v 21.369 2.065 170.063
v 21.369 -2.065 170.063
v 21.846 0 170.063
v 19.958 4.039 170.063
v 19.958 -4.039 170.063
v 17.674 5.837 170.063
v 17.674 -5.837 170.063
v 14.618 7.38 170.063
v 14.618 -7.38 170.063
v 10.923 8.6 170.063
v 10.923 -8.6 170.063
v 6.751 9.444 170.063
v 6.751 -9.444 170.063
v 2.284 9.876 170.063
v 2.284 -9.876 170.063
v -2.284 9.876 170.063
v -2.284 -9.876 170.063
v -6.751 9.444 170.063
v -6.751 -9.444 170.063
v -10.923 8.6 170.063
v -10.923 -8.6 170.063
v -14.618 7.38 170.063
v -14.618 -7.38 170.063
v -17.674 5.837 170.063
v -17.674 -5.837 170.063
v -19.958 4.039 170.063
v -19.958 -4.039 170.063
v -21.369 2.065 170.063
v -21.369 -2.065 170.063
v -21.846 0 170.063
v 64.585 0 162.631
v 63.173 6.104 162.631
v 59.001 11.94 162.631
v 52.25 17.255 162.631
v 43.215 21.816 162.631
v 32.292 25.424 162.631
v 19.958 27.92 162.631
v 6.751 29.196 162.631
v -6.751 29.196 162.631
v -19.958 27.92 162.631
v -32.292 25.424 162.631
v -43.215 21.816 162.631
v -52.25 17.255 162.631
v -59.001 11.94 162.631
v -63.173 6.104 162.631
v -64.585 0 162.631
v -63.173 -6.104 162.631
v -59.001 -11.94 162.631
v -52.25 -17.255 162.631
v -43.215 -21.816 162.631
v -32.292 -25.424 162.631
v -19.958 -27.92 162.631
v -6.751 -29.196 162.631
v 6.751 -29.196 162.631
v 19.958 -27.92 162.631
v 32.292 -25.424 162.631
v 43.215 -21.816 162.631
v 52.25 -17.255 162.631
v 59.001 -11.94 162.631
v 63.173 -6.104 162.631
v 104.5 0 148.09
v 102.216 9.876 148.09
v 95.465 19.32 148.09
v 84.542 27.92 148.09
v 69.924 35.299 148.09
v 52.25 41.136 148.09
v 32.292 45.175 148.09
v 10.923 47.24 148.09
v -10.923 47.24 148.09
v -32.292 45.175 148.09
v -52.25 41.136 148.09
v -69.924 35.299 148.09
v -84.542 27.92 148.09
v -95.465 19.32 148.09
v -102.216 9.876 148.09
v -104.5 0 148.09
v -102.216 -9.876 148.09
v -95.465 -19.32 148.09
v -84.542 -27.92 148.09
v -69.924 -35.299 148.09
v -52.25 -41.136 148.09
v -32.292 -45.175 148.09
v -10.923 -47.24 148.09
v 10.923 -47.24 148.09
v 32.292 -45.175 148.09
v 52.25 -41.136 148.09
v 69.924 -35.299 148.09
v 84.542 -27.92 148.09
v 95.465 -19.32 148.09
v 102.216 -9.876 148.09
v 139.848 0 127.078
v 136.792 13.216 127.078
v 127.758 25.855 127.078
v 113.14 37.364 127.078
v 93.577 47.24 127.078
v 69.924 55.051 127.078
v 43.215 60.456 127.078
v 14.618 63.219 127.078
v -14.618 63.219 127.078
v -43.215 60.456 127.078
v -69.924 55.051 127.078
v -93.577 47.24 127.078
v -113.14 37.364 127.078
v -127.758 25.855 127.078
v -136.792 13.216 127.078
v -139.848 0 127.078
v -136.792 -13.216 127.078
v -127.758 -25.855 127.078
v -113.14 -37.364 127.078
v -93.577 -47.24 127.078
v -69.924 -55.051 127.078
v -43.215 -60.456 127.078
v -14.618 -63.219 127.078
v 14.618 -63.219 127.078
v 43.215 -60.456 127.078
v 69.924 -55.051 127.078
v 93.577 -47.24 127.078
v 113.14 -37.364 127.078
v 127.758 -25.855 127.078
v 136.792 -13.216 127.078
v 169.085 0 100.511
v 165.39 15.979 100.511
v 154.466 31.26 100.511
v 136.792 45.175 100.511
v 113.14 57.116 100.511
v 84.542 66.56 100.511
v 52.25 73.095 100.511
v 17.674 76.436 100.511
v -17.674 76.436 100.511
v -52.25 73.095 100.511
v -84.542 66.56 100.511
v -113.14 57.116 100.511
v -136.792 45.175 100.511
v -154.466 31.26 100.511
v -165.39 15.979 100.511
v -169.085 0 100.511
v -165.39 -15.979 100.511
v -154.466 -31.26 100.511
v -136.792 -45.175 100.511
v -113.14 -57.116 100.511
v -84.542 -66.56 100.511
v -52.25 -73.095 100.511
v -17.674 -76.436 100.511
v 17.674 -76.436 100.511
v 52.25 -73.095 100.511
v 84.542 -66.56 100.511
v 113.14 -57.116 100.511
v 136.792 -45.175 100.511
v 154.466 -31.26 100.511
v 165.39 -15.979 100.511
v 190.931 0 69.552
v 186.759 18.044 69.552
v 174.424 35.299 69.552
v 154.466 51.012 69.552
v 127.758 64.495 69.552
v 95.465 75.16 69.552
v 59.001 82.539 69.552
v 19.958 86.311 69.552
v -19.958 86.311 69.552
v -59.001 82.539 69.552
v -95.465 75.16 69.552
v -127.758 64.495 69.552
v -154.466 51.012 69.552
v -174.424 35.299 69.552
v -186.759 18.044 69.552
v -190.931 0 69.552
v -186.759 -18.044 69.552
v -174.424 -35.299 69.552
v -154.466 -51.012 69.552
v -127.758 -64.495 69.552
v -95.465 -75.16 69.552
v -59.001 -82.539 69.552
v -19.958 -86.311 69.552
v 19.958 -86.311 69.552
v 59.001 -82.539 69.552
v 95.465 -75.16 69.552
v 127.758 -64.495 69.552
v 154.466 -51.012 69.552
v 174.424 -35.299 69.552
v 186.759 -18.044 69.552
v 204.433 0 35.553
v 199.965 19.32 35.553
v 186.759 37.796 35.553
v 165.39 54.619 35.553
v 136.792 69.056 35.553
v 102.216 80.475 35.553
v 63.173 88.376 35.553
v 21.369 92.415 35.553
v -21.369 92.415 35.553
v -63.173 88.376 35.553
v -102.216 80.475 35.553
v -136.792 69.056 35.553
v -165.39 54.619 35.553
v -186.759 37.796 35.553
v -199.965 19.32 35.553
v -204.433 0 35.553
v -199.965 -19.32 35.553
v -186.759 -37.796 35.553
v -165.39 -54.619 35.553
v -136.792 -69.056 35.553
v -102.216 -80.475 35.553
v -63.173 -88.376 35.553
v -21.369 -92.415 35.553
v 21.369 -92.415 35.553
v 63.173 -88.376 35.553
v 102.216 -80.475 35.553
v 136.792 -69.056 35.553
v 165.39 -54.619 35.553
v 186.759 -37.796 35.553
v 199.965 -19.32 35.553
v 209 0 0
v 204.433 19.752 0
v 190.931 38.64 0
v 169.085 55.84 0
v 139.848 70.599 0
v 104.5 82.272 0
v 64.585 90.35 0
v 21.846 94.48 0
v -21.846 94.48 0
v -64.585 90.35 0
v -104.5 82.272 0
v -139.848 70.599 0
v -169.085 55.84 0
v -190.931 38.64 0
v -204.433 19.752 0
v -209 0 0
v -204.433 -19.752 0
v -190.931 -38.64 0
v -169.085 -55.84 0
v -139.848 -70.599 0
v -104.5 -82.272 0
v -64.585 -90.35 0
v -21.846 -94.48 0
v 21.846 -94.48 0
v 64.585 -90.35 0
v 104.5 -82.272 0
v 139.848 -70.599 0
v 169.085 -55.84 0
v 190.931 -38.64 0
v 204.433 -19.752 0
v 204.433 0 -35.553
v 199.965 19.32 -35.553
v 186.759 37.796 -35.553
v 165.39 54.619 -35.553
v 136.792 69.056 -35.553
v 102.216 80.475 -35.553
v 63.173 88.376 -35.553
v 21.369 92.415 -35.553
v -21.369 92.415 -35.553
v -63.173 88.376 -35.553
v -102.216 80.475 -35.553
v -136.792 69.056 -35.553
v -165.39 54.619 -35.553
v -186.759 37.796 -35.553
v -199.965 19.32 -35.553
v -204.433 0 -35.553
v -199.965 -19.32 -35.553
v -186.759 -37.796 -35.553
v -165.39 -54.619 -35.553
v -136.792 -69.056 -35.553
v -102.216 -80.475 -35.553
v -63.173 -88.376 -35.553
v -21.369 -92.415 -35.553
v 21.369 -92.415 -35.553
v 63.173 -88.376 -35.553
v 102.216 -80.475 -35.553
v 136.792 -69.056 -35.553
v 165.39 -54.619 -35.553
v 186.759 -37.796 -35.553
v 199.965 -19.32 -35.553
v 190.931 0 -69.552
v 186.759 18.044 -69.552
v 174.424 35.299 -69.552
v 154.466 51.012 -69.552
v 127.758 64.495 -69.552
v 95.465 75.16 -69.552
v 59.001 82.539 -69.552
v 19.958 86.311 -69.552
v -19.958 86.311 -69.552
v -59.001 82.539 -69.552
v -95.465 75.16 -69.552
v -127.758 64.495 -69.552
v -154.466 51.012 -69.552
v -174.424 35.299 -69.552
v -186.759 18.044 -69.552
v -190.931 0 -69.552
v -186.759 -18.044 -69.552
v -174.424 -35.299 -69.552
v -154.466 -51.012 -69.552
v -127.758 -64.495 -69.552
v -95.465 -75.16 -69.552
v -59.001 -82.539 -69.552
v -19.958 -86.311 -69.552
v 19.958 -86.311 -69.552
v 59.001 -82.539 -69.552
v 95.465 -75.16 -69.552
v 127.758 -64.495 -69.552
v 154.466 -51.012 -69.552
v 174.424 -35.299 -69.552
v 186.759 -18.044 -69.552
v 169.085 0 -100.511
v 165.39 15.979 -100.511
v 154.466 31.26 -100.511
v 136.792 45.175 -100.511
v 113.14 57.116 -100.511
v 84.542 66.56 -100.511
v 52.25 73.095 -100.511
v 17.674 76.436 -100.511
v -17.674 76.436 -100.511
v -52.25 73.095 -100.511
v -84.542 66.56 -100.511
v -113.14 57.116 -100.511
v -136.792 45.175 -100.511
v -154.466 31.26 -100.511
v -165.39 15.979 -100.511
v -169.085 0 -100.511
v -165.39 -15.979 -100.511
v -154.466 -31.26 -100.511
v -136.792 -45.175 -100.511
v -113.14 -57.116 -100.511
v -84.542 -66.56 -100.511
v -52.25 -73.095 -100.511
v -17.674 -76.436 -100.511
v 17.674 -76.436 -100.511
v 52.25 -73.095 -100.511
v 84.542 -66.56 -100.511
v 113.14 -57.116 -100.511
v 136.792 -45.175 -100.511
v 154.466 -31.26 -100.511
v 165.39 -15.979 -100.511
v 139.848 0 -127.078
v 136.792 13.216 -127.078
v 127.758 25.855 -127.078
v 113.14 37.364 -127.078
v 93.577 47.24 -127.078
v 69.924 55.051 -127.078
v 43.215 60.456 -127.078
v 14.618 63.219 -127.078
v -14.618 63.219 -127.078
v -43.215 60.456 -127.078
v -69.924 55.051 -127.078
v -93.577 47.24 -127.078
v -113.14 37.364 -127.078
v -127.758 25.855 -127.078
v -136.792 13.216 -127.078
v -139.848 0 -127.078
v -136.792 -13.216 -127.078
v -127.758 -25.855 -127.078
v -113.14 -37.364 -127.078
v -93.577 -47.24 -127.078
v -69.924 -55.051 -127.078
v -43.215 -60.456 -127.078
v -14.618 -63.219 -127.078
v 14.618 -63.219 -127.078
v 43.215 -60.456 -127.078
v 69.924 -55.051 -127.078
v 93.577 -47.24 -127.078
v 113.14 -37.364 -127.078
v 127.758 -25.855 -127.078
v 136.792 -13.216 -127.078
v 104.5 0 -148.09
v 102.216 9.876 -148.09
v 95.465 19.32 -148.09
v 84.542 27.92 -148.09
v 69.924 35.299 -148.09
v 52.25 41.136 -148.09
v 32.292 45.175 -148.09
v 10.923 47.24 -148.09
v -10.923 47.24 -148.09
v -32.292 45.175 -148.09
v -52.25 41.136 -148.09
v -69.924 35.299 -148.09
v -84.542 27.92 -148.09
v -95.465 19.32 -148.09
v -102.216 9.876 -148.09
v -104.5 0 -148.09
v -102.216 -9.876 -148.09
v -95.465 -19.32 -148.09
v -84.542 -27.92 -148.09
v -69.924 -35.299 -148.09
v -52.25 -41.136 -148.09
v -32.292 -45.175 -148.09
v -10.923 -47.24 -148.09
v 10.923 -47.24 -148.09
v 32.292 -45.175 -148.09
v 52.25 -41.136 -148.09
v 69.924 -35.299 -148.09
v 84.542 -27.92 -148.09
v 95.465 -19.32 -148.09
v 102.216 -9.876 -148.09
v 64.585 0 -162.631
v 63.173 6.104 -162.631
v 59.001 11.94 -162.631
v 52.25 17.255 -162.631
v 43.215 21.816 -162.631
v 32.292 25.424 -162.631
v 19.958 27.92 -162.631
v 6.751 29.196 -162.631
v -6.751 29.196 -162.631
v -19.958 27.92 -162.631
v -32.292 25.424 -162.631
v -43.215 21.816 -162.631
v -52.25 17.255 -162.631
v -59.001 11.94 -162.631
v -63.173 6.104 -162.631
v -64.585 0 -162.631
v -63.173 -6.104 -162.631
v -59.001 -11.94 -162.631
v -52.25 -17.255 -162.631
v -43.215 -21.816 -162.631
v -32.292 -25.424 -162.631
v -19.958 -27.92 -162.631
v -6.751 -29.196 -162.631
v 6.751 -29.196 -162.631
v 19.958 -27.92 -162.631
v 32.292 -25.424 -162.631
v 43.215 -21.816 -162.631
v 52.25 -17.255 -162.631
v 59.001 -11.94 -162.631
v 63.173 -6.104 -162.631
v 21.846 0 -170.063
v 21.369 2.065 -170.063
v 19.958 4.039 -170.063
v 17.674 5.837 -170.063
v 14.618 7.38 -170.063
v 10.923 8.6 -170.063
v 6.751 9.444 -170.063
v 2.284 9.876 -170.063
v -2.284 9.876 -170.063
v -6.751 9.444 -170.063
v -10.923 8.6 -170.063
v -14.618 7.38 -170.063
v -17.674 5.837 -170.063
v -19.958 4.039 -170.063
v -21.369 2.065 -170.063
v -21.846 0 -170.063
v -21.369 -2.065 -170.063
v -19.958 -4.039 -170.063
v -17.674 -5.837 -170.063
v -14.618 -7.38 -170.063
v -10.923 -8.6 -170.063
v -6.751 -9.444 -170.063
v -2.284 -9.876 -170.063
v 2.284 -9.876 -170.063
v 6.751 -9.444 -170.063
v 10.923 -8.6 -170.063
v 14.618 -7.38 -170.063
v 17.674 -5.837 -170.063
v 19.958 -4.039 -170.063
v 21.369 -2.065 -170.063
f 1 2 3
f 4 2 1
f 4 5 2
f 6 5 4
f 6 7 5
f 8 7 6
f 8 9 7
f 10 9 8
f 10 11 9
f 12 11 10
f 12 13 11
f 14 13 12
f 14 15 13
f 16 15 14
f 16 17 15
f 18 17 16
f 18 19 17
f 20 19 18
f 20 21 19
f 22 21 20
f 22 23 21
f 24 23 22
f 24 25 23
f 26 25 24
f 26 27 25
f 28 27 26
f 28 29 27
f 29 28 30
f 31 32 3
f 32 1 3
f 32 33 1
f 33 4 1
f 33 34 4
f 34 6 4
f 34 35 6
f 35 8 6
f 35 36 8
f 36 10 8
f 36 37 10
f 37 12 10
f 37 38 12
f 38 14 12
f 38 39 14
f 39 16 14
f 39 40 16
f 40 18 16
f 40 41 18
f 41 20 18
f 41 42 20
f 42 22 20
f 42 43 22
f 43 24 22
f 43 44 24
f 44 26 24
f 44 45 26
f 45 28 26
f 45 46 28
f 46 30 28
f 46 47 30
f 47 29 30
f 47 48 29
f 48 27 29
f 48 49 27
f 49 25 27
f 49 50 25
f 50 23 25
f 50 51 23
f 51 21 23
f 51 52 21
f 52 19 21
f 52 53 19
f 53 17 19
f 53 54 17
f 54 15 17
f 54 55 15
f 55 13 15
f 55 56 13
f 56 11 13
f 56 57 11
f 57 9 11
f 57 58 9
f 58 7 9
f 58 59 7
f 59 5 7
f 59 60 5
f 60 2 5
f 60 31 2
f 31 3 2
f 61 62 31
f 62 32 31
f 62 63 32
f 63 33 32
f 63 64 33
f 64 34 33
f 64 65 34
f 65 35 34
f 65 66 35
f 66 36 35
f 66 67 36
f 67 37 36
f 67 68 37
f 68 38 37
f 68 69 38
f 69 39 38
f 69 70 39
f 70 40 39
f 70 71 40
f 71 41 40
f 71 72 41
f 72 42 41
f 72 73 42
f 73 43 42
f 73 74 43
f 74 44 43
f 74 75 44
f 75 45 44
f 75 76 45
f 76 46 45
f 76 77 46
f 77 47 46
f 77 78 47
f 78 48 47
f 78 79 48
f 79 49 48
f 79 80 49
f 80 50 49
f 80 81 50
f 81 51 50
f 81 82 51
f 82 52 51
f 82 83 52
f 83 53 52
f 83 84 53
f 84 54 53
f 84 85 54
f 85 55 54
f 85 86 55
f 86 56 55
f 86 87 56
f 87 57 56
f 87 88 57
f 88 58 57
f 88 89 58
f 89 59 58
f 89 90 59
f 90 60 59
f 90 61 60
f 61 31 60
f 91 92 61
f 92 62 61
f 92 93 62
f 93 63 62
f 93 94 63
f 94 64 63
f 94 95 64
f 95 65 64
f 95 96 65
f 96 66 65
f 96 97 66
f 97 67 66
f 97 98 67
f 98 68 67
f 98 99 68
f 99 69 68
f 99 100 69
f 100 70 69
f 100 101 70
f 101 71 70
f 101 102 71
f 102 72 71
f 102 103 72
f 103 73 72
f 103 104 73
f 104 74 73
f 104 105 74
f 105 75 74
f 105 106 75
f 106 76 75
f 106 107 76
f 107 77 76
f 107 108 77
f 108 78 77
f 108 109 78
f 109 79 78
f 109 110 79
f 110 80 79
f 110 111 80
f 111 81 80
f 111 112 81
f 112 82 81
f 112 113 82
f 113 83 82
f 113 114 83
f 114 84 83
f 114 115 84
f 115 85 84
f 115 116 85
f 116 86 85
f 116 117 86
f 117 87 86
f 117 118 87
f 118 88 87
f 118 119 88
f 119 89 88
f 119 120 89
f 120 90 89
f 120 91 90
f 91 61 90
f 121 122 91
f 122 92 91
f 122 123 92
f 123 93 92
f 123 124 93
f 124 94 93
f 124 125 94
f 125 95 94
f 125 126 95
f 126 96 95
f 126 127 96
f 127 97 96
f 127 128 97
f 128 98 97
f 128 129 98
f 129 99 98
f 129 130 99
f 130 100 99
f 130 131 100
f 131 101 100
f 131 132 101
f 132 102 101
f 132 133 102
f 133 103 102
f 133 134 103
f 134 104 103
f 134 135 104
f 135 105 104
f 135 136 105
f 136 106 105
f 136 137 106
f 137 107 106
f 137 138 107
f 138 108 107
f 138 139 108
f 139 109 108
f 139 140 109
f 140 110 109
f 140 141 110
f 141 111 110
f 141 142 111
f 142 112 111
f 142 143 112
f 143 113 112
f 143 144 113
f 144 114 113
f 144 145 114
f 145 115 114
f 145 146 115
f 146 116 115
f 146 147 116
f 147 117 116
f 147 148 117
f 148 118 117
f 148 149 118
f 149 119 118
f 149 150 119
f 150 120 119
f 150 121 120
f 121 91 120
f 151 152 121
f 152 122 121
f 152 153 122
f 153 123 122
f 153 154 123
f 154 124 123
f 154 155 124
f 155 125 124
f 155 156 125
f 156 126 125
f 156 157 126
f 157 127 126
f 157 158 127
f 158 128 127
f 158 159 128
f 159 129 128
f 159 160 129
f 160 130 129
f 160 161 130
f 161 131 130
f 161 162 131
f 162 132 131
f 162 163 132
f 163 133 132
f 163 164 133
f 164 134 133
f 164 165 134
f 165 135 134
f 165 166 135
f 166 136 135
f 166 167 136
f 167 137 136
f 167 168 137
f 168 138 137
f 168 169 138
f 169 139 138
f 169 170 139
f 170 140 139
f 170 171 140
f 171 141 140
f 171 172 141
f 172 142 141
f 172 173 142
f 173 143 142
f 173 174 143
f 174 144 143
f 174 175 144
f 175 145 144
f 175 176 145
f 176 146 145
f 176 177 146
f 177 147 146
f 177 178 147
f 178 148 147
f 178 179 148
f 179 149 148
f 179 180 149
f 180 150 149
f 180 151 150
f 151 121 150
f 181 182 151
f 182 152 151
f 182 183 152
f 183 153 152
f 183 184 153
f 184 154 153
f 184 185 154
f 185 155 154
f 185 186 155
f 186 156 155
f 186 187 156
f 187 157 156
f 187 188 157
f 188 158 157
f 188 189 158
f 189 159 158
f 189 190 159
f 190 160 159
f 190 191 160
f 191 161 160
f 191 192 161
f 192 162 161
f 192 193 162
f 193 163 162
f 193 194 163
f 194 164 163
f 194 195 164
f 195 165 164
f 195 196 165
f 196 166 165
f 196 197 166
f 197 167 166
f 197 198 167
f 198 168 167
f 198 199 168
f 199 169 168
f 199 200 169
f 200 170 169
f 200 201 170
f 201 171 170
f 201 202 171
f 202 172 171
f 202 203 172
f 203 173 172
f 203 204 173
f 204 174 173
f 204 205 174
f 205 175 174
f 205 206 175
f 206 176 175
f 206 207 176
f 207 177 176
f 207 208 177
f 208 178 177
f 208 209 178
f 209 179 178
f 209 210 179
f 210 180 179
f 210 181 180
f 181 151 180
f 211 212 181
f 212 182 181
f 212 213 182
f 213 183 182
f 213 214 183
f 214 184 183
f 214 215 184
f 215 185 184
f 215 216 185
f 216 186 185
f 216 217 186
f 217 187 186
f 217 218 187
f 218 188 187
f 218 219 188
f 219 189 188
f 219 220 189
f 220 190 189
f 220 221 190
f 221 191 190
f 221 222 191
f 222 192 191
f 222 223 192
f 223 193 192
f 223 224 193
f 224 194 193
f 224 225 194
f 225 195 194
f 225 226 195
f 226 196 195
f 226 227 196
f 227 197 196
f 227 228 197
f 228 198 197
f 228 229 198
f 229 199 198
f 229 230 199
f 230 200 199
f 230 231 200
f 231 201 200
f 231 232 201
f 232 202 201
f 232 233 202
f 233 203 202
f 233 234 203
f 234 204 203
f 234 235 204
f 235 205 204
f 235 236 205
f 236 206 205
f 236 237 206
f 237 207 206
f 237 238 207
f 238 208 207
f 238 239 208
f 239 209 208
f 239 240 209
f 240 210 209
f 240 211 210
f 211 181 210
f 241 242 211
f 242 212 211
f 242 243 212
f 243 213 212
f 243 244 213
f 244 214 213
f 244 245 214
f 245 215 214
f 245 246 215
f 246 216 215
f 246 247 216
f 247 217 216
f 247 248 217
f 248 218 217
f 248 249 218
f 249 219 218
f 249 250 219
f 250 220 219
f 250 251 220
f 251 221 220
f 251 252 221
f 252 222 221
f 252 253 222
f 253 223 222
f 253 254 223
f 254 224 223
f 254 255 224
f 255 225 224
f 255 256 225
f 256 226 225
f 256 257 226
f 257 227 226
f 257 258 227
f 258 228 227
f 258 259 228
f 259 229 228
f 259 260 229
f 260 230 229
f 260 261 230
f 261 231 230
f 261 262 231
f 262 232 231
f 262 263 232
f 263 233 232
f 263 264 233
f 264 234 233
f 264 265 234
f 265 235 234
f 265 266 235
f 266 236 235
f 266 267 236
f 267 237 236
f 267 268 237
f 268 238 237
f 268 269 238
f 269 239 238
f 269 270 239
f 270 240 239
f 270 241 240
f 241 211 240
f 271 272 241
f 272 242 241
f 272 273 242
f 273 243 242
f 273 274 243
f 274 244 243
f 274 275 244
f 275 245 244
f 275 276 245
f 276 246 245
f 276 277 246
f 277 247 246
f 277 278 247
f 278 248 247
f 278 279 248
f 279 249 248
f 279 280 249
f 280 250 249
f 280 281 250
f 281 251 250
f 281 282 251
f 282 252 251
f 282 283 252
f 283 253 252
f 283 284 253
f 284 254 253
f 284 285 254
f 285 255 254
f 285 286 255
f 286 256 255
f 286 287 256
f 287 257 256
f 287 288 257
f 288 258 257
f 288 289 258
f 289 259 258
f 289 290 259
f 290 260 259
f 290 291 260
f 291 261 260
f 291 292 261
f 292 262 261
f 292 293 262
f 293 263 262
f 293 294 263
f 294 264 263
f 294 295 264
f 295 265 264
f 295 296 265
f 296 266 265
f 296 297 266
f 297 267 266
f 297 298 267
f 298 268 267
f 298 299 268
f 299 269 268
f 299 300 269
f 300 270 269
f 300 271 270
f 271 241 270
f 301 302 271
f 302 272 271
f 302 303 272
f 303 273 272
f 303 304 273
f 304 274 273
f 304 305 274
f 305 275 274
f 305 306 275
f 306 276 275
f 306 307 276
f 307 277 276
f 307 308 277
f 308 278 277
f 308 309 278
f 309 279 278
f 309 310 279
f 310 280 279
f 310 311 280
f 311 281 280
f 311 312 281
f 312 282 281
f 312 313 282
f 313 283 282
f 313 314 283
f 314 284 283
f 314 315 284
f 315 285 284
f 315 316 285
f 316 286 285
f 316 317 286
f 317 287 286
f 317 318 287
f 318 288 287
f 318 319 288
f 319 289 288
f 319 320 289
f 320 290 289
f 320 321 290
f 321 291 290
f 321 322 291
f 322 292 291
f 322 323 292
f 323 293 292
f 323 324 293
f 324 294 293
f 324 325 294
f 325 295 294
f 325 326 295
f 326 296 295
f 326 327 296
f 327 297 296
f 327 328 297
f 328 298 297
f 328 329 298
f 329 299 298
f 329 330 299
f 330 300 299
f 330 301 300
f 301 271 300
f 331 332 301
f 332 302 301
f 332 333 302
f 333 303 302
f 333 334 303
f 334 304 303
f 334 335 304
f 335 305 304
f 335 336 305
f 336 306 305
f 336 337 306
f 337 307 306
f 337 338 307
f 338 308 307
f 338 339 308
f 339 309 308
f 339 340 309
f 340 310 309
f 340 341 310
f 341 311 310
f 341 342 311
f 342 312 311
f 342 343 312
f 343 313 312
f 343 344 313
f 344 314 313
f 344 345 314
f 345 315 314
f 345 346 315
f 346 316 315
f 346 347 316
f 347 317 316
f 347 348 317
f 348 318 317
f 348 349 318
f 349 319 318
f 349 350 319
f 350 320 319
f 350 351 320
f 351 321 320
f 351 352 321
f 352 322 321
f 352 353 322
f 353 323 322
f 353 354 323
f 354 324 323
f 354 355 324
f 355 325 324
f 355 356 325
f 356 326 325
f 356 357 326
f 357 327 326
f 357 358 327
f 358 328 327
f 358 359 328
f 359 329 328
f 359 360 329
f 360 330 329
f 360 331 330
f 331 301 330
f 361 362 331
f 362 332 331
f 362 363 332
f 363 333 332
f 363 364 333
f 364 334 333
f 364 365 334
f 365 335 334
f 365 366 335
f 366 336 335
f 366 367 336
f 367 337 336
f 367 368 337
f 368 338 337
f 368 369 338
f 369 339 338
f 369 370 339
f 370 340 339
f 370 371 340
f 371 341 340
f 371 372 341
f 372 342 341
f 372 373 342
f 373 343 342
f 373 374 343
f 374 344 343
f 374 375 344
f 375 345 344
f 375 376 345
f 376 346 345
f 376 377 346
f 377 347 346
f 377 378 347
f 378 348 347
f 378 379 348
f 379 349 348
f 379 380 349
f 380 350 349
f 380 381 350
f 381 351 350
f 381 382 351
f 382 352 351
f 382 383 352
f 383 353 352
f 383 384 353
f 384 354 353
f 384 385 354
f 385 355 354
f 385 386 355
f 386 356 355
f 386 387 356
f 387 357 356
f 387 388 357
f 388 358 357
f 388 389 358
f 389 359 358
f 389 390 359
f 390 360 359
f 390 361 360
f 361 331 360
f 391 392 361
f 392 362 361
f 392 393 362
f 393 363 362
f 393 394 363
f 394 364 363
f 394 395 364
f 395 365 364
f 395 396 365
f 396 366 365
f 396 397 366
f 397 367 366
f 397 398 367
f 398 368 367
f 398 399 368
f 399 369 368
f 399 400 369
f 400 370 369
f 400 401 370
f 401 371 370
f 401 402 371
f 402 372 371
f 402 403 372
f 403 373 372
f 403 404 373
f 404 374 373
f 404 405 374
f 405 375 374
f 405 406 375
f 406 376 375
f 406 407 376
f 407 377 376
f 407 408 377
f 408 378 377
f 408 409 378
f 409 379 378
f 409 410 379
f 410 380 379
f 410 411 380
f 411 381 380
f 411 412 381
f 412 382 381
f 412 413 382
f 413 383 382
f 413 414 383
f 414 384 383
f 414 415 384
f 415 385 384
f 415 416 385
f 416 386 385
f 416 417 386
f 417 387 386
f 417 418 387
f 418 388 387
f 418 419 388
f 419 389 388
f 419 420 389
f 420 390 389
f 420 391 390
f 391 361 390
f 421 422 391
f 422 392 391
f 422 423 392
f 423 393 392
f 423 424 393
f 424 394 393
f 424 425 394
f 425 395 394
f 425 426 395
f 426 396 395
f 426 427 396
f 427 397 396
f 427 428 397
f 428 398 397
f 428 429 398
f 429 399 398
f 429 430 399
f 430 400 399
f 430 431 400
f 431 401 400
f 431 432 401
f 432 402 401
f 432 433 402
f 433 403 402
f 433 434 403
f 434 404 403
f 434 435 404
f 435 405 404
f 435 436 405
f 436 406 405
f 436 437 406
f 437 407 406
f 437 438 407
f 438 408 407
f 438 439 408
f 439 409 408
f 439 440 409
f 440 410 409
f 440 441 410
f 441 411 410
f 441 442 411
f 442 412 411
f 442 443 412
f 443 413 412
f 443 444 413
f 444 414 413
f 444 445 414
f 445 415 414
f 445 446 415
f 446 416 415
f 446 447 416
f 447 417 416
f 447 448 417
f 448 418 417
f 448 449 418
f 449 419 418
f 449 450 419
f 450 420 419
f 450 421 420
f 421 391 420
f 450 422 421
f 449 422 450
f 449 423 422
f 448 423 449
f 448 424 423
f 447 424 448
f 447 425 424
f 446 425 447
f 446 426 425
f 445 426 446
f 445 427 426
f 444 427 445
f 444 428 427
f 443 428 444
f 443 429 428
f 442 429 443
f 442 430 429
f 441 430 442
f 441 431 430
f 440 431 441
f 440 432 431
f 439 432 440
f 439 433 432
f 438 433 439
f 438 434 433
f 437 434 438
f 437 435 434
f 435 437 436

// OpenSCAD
// Generated by SolidPython 1.0.1 on 2020-07-29 00:46:49


scale(v = [11, 5, 9]) {
	sphere(r = 19);
}
/***********************************************
*********      SolidPython code:      **********
************************************************
 
# import packages: SolidPython
from solid import *
from solid.utils import *
from itertools import chain, combinations, permutations


class Resize:

    def __init__(self, scad_file):
        self.scad_file = scad_file
        #self.scad_file = import_scad(scad_file)
        # cone/cylinder param:
        self.r1 = 0
        self.r2 = 0
        self.h = 0
        # rectangular prism param:
        self.w = 0
        self.l = 0
        # ellipse param:
        self.r = 0

    # import OpenScad code (file name corresponds to shape)


    # classify shape + parameters
    def assign(self, param1, param2, param3):
        if self.scad_file == 'cone.scad':
            self.r1 = param1
            self.r2 = param2
            self.h = param3
        elif self.scad_file == 'cylinder.scad':
            self.r1 = param1
            self.r2 = param2
            self.h = param3
        elif self.scad_file == 'rectangularPrism.scad':
            self.h = param1
            self.l = param2
            self.w = param3
        else:
            self.r = param1
            self.h = param2

    # resize parameters
    def iterate(self):
        x = range(3, 20, 2)
        i = 1
        if self.scad_file == 'cone.scad':
            tempList = list(permutations(x, 2))
            for temp in tempList:
                param1 = temp[0]
                param2 = temp[1]
                filepath = 'produced_scad_files/' + 'cone' + str(param1) + '_' + str(param2) + '_' + '.scad'
                scad_render_to_file(cylinder(h=param1, r1=param2, r2=0), filepath)

        elif self.scad_file == 'cylinder.scad':
            tempList = list(permutations(x, 3))
            for temp in tempList:
                param1 = temp[0]
                param2 = temp[1]
                filepath = 'produced_scad_files/' + 'cylinder' + str(param1) + '_' + str(param2) + '_' + '.scad'
                scad_render_to_file(cylinder(h=param1, r1=param2, r2=param2), filepath)

        elif self.scad_file == 'rectangularPrism.scad':
            tempList = list(permutations(x, 3))
            for temp in tempList:
                param1 = temp[0]
                param2 = temp[1]
                param3 = temp[2]
                filepath = 'produced_scad_files/' + 'rectangularPrism' + str(param1) + '_' + str(param2) + '_' + str(
                    param3) + '.scad'
                scad_render_to_file(cube(size=(param1, param2, param3)), filepath)

        elif self.scad_file == 'ellipse.scad':
            tempList = list(permutations(x, 4))
            for temp in tempList:
                param1 = temp[0]
                param2 = temp[1]
                param3 = temp[2]
                param4 = temp[3]
                filepath = 'produced_scad_files/' + 'ellipse' + str(param1) + '_' + str(param2) + '_' + str(param3) + '_' + str(param4) + '.scad'
                scad_render_to_file(scale([param1, param2, param3])(sphere(r=param4)), filepath)

    def render_to_scadfile(self):
        scad_render_to_file(scad, 'example.scad') 
 
************************************************/
